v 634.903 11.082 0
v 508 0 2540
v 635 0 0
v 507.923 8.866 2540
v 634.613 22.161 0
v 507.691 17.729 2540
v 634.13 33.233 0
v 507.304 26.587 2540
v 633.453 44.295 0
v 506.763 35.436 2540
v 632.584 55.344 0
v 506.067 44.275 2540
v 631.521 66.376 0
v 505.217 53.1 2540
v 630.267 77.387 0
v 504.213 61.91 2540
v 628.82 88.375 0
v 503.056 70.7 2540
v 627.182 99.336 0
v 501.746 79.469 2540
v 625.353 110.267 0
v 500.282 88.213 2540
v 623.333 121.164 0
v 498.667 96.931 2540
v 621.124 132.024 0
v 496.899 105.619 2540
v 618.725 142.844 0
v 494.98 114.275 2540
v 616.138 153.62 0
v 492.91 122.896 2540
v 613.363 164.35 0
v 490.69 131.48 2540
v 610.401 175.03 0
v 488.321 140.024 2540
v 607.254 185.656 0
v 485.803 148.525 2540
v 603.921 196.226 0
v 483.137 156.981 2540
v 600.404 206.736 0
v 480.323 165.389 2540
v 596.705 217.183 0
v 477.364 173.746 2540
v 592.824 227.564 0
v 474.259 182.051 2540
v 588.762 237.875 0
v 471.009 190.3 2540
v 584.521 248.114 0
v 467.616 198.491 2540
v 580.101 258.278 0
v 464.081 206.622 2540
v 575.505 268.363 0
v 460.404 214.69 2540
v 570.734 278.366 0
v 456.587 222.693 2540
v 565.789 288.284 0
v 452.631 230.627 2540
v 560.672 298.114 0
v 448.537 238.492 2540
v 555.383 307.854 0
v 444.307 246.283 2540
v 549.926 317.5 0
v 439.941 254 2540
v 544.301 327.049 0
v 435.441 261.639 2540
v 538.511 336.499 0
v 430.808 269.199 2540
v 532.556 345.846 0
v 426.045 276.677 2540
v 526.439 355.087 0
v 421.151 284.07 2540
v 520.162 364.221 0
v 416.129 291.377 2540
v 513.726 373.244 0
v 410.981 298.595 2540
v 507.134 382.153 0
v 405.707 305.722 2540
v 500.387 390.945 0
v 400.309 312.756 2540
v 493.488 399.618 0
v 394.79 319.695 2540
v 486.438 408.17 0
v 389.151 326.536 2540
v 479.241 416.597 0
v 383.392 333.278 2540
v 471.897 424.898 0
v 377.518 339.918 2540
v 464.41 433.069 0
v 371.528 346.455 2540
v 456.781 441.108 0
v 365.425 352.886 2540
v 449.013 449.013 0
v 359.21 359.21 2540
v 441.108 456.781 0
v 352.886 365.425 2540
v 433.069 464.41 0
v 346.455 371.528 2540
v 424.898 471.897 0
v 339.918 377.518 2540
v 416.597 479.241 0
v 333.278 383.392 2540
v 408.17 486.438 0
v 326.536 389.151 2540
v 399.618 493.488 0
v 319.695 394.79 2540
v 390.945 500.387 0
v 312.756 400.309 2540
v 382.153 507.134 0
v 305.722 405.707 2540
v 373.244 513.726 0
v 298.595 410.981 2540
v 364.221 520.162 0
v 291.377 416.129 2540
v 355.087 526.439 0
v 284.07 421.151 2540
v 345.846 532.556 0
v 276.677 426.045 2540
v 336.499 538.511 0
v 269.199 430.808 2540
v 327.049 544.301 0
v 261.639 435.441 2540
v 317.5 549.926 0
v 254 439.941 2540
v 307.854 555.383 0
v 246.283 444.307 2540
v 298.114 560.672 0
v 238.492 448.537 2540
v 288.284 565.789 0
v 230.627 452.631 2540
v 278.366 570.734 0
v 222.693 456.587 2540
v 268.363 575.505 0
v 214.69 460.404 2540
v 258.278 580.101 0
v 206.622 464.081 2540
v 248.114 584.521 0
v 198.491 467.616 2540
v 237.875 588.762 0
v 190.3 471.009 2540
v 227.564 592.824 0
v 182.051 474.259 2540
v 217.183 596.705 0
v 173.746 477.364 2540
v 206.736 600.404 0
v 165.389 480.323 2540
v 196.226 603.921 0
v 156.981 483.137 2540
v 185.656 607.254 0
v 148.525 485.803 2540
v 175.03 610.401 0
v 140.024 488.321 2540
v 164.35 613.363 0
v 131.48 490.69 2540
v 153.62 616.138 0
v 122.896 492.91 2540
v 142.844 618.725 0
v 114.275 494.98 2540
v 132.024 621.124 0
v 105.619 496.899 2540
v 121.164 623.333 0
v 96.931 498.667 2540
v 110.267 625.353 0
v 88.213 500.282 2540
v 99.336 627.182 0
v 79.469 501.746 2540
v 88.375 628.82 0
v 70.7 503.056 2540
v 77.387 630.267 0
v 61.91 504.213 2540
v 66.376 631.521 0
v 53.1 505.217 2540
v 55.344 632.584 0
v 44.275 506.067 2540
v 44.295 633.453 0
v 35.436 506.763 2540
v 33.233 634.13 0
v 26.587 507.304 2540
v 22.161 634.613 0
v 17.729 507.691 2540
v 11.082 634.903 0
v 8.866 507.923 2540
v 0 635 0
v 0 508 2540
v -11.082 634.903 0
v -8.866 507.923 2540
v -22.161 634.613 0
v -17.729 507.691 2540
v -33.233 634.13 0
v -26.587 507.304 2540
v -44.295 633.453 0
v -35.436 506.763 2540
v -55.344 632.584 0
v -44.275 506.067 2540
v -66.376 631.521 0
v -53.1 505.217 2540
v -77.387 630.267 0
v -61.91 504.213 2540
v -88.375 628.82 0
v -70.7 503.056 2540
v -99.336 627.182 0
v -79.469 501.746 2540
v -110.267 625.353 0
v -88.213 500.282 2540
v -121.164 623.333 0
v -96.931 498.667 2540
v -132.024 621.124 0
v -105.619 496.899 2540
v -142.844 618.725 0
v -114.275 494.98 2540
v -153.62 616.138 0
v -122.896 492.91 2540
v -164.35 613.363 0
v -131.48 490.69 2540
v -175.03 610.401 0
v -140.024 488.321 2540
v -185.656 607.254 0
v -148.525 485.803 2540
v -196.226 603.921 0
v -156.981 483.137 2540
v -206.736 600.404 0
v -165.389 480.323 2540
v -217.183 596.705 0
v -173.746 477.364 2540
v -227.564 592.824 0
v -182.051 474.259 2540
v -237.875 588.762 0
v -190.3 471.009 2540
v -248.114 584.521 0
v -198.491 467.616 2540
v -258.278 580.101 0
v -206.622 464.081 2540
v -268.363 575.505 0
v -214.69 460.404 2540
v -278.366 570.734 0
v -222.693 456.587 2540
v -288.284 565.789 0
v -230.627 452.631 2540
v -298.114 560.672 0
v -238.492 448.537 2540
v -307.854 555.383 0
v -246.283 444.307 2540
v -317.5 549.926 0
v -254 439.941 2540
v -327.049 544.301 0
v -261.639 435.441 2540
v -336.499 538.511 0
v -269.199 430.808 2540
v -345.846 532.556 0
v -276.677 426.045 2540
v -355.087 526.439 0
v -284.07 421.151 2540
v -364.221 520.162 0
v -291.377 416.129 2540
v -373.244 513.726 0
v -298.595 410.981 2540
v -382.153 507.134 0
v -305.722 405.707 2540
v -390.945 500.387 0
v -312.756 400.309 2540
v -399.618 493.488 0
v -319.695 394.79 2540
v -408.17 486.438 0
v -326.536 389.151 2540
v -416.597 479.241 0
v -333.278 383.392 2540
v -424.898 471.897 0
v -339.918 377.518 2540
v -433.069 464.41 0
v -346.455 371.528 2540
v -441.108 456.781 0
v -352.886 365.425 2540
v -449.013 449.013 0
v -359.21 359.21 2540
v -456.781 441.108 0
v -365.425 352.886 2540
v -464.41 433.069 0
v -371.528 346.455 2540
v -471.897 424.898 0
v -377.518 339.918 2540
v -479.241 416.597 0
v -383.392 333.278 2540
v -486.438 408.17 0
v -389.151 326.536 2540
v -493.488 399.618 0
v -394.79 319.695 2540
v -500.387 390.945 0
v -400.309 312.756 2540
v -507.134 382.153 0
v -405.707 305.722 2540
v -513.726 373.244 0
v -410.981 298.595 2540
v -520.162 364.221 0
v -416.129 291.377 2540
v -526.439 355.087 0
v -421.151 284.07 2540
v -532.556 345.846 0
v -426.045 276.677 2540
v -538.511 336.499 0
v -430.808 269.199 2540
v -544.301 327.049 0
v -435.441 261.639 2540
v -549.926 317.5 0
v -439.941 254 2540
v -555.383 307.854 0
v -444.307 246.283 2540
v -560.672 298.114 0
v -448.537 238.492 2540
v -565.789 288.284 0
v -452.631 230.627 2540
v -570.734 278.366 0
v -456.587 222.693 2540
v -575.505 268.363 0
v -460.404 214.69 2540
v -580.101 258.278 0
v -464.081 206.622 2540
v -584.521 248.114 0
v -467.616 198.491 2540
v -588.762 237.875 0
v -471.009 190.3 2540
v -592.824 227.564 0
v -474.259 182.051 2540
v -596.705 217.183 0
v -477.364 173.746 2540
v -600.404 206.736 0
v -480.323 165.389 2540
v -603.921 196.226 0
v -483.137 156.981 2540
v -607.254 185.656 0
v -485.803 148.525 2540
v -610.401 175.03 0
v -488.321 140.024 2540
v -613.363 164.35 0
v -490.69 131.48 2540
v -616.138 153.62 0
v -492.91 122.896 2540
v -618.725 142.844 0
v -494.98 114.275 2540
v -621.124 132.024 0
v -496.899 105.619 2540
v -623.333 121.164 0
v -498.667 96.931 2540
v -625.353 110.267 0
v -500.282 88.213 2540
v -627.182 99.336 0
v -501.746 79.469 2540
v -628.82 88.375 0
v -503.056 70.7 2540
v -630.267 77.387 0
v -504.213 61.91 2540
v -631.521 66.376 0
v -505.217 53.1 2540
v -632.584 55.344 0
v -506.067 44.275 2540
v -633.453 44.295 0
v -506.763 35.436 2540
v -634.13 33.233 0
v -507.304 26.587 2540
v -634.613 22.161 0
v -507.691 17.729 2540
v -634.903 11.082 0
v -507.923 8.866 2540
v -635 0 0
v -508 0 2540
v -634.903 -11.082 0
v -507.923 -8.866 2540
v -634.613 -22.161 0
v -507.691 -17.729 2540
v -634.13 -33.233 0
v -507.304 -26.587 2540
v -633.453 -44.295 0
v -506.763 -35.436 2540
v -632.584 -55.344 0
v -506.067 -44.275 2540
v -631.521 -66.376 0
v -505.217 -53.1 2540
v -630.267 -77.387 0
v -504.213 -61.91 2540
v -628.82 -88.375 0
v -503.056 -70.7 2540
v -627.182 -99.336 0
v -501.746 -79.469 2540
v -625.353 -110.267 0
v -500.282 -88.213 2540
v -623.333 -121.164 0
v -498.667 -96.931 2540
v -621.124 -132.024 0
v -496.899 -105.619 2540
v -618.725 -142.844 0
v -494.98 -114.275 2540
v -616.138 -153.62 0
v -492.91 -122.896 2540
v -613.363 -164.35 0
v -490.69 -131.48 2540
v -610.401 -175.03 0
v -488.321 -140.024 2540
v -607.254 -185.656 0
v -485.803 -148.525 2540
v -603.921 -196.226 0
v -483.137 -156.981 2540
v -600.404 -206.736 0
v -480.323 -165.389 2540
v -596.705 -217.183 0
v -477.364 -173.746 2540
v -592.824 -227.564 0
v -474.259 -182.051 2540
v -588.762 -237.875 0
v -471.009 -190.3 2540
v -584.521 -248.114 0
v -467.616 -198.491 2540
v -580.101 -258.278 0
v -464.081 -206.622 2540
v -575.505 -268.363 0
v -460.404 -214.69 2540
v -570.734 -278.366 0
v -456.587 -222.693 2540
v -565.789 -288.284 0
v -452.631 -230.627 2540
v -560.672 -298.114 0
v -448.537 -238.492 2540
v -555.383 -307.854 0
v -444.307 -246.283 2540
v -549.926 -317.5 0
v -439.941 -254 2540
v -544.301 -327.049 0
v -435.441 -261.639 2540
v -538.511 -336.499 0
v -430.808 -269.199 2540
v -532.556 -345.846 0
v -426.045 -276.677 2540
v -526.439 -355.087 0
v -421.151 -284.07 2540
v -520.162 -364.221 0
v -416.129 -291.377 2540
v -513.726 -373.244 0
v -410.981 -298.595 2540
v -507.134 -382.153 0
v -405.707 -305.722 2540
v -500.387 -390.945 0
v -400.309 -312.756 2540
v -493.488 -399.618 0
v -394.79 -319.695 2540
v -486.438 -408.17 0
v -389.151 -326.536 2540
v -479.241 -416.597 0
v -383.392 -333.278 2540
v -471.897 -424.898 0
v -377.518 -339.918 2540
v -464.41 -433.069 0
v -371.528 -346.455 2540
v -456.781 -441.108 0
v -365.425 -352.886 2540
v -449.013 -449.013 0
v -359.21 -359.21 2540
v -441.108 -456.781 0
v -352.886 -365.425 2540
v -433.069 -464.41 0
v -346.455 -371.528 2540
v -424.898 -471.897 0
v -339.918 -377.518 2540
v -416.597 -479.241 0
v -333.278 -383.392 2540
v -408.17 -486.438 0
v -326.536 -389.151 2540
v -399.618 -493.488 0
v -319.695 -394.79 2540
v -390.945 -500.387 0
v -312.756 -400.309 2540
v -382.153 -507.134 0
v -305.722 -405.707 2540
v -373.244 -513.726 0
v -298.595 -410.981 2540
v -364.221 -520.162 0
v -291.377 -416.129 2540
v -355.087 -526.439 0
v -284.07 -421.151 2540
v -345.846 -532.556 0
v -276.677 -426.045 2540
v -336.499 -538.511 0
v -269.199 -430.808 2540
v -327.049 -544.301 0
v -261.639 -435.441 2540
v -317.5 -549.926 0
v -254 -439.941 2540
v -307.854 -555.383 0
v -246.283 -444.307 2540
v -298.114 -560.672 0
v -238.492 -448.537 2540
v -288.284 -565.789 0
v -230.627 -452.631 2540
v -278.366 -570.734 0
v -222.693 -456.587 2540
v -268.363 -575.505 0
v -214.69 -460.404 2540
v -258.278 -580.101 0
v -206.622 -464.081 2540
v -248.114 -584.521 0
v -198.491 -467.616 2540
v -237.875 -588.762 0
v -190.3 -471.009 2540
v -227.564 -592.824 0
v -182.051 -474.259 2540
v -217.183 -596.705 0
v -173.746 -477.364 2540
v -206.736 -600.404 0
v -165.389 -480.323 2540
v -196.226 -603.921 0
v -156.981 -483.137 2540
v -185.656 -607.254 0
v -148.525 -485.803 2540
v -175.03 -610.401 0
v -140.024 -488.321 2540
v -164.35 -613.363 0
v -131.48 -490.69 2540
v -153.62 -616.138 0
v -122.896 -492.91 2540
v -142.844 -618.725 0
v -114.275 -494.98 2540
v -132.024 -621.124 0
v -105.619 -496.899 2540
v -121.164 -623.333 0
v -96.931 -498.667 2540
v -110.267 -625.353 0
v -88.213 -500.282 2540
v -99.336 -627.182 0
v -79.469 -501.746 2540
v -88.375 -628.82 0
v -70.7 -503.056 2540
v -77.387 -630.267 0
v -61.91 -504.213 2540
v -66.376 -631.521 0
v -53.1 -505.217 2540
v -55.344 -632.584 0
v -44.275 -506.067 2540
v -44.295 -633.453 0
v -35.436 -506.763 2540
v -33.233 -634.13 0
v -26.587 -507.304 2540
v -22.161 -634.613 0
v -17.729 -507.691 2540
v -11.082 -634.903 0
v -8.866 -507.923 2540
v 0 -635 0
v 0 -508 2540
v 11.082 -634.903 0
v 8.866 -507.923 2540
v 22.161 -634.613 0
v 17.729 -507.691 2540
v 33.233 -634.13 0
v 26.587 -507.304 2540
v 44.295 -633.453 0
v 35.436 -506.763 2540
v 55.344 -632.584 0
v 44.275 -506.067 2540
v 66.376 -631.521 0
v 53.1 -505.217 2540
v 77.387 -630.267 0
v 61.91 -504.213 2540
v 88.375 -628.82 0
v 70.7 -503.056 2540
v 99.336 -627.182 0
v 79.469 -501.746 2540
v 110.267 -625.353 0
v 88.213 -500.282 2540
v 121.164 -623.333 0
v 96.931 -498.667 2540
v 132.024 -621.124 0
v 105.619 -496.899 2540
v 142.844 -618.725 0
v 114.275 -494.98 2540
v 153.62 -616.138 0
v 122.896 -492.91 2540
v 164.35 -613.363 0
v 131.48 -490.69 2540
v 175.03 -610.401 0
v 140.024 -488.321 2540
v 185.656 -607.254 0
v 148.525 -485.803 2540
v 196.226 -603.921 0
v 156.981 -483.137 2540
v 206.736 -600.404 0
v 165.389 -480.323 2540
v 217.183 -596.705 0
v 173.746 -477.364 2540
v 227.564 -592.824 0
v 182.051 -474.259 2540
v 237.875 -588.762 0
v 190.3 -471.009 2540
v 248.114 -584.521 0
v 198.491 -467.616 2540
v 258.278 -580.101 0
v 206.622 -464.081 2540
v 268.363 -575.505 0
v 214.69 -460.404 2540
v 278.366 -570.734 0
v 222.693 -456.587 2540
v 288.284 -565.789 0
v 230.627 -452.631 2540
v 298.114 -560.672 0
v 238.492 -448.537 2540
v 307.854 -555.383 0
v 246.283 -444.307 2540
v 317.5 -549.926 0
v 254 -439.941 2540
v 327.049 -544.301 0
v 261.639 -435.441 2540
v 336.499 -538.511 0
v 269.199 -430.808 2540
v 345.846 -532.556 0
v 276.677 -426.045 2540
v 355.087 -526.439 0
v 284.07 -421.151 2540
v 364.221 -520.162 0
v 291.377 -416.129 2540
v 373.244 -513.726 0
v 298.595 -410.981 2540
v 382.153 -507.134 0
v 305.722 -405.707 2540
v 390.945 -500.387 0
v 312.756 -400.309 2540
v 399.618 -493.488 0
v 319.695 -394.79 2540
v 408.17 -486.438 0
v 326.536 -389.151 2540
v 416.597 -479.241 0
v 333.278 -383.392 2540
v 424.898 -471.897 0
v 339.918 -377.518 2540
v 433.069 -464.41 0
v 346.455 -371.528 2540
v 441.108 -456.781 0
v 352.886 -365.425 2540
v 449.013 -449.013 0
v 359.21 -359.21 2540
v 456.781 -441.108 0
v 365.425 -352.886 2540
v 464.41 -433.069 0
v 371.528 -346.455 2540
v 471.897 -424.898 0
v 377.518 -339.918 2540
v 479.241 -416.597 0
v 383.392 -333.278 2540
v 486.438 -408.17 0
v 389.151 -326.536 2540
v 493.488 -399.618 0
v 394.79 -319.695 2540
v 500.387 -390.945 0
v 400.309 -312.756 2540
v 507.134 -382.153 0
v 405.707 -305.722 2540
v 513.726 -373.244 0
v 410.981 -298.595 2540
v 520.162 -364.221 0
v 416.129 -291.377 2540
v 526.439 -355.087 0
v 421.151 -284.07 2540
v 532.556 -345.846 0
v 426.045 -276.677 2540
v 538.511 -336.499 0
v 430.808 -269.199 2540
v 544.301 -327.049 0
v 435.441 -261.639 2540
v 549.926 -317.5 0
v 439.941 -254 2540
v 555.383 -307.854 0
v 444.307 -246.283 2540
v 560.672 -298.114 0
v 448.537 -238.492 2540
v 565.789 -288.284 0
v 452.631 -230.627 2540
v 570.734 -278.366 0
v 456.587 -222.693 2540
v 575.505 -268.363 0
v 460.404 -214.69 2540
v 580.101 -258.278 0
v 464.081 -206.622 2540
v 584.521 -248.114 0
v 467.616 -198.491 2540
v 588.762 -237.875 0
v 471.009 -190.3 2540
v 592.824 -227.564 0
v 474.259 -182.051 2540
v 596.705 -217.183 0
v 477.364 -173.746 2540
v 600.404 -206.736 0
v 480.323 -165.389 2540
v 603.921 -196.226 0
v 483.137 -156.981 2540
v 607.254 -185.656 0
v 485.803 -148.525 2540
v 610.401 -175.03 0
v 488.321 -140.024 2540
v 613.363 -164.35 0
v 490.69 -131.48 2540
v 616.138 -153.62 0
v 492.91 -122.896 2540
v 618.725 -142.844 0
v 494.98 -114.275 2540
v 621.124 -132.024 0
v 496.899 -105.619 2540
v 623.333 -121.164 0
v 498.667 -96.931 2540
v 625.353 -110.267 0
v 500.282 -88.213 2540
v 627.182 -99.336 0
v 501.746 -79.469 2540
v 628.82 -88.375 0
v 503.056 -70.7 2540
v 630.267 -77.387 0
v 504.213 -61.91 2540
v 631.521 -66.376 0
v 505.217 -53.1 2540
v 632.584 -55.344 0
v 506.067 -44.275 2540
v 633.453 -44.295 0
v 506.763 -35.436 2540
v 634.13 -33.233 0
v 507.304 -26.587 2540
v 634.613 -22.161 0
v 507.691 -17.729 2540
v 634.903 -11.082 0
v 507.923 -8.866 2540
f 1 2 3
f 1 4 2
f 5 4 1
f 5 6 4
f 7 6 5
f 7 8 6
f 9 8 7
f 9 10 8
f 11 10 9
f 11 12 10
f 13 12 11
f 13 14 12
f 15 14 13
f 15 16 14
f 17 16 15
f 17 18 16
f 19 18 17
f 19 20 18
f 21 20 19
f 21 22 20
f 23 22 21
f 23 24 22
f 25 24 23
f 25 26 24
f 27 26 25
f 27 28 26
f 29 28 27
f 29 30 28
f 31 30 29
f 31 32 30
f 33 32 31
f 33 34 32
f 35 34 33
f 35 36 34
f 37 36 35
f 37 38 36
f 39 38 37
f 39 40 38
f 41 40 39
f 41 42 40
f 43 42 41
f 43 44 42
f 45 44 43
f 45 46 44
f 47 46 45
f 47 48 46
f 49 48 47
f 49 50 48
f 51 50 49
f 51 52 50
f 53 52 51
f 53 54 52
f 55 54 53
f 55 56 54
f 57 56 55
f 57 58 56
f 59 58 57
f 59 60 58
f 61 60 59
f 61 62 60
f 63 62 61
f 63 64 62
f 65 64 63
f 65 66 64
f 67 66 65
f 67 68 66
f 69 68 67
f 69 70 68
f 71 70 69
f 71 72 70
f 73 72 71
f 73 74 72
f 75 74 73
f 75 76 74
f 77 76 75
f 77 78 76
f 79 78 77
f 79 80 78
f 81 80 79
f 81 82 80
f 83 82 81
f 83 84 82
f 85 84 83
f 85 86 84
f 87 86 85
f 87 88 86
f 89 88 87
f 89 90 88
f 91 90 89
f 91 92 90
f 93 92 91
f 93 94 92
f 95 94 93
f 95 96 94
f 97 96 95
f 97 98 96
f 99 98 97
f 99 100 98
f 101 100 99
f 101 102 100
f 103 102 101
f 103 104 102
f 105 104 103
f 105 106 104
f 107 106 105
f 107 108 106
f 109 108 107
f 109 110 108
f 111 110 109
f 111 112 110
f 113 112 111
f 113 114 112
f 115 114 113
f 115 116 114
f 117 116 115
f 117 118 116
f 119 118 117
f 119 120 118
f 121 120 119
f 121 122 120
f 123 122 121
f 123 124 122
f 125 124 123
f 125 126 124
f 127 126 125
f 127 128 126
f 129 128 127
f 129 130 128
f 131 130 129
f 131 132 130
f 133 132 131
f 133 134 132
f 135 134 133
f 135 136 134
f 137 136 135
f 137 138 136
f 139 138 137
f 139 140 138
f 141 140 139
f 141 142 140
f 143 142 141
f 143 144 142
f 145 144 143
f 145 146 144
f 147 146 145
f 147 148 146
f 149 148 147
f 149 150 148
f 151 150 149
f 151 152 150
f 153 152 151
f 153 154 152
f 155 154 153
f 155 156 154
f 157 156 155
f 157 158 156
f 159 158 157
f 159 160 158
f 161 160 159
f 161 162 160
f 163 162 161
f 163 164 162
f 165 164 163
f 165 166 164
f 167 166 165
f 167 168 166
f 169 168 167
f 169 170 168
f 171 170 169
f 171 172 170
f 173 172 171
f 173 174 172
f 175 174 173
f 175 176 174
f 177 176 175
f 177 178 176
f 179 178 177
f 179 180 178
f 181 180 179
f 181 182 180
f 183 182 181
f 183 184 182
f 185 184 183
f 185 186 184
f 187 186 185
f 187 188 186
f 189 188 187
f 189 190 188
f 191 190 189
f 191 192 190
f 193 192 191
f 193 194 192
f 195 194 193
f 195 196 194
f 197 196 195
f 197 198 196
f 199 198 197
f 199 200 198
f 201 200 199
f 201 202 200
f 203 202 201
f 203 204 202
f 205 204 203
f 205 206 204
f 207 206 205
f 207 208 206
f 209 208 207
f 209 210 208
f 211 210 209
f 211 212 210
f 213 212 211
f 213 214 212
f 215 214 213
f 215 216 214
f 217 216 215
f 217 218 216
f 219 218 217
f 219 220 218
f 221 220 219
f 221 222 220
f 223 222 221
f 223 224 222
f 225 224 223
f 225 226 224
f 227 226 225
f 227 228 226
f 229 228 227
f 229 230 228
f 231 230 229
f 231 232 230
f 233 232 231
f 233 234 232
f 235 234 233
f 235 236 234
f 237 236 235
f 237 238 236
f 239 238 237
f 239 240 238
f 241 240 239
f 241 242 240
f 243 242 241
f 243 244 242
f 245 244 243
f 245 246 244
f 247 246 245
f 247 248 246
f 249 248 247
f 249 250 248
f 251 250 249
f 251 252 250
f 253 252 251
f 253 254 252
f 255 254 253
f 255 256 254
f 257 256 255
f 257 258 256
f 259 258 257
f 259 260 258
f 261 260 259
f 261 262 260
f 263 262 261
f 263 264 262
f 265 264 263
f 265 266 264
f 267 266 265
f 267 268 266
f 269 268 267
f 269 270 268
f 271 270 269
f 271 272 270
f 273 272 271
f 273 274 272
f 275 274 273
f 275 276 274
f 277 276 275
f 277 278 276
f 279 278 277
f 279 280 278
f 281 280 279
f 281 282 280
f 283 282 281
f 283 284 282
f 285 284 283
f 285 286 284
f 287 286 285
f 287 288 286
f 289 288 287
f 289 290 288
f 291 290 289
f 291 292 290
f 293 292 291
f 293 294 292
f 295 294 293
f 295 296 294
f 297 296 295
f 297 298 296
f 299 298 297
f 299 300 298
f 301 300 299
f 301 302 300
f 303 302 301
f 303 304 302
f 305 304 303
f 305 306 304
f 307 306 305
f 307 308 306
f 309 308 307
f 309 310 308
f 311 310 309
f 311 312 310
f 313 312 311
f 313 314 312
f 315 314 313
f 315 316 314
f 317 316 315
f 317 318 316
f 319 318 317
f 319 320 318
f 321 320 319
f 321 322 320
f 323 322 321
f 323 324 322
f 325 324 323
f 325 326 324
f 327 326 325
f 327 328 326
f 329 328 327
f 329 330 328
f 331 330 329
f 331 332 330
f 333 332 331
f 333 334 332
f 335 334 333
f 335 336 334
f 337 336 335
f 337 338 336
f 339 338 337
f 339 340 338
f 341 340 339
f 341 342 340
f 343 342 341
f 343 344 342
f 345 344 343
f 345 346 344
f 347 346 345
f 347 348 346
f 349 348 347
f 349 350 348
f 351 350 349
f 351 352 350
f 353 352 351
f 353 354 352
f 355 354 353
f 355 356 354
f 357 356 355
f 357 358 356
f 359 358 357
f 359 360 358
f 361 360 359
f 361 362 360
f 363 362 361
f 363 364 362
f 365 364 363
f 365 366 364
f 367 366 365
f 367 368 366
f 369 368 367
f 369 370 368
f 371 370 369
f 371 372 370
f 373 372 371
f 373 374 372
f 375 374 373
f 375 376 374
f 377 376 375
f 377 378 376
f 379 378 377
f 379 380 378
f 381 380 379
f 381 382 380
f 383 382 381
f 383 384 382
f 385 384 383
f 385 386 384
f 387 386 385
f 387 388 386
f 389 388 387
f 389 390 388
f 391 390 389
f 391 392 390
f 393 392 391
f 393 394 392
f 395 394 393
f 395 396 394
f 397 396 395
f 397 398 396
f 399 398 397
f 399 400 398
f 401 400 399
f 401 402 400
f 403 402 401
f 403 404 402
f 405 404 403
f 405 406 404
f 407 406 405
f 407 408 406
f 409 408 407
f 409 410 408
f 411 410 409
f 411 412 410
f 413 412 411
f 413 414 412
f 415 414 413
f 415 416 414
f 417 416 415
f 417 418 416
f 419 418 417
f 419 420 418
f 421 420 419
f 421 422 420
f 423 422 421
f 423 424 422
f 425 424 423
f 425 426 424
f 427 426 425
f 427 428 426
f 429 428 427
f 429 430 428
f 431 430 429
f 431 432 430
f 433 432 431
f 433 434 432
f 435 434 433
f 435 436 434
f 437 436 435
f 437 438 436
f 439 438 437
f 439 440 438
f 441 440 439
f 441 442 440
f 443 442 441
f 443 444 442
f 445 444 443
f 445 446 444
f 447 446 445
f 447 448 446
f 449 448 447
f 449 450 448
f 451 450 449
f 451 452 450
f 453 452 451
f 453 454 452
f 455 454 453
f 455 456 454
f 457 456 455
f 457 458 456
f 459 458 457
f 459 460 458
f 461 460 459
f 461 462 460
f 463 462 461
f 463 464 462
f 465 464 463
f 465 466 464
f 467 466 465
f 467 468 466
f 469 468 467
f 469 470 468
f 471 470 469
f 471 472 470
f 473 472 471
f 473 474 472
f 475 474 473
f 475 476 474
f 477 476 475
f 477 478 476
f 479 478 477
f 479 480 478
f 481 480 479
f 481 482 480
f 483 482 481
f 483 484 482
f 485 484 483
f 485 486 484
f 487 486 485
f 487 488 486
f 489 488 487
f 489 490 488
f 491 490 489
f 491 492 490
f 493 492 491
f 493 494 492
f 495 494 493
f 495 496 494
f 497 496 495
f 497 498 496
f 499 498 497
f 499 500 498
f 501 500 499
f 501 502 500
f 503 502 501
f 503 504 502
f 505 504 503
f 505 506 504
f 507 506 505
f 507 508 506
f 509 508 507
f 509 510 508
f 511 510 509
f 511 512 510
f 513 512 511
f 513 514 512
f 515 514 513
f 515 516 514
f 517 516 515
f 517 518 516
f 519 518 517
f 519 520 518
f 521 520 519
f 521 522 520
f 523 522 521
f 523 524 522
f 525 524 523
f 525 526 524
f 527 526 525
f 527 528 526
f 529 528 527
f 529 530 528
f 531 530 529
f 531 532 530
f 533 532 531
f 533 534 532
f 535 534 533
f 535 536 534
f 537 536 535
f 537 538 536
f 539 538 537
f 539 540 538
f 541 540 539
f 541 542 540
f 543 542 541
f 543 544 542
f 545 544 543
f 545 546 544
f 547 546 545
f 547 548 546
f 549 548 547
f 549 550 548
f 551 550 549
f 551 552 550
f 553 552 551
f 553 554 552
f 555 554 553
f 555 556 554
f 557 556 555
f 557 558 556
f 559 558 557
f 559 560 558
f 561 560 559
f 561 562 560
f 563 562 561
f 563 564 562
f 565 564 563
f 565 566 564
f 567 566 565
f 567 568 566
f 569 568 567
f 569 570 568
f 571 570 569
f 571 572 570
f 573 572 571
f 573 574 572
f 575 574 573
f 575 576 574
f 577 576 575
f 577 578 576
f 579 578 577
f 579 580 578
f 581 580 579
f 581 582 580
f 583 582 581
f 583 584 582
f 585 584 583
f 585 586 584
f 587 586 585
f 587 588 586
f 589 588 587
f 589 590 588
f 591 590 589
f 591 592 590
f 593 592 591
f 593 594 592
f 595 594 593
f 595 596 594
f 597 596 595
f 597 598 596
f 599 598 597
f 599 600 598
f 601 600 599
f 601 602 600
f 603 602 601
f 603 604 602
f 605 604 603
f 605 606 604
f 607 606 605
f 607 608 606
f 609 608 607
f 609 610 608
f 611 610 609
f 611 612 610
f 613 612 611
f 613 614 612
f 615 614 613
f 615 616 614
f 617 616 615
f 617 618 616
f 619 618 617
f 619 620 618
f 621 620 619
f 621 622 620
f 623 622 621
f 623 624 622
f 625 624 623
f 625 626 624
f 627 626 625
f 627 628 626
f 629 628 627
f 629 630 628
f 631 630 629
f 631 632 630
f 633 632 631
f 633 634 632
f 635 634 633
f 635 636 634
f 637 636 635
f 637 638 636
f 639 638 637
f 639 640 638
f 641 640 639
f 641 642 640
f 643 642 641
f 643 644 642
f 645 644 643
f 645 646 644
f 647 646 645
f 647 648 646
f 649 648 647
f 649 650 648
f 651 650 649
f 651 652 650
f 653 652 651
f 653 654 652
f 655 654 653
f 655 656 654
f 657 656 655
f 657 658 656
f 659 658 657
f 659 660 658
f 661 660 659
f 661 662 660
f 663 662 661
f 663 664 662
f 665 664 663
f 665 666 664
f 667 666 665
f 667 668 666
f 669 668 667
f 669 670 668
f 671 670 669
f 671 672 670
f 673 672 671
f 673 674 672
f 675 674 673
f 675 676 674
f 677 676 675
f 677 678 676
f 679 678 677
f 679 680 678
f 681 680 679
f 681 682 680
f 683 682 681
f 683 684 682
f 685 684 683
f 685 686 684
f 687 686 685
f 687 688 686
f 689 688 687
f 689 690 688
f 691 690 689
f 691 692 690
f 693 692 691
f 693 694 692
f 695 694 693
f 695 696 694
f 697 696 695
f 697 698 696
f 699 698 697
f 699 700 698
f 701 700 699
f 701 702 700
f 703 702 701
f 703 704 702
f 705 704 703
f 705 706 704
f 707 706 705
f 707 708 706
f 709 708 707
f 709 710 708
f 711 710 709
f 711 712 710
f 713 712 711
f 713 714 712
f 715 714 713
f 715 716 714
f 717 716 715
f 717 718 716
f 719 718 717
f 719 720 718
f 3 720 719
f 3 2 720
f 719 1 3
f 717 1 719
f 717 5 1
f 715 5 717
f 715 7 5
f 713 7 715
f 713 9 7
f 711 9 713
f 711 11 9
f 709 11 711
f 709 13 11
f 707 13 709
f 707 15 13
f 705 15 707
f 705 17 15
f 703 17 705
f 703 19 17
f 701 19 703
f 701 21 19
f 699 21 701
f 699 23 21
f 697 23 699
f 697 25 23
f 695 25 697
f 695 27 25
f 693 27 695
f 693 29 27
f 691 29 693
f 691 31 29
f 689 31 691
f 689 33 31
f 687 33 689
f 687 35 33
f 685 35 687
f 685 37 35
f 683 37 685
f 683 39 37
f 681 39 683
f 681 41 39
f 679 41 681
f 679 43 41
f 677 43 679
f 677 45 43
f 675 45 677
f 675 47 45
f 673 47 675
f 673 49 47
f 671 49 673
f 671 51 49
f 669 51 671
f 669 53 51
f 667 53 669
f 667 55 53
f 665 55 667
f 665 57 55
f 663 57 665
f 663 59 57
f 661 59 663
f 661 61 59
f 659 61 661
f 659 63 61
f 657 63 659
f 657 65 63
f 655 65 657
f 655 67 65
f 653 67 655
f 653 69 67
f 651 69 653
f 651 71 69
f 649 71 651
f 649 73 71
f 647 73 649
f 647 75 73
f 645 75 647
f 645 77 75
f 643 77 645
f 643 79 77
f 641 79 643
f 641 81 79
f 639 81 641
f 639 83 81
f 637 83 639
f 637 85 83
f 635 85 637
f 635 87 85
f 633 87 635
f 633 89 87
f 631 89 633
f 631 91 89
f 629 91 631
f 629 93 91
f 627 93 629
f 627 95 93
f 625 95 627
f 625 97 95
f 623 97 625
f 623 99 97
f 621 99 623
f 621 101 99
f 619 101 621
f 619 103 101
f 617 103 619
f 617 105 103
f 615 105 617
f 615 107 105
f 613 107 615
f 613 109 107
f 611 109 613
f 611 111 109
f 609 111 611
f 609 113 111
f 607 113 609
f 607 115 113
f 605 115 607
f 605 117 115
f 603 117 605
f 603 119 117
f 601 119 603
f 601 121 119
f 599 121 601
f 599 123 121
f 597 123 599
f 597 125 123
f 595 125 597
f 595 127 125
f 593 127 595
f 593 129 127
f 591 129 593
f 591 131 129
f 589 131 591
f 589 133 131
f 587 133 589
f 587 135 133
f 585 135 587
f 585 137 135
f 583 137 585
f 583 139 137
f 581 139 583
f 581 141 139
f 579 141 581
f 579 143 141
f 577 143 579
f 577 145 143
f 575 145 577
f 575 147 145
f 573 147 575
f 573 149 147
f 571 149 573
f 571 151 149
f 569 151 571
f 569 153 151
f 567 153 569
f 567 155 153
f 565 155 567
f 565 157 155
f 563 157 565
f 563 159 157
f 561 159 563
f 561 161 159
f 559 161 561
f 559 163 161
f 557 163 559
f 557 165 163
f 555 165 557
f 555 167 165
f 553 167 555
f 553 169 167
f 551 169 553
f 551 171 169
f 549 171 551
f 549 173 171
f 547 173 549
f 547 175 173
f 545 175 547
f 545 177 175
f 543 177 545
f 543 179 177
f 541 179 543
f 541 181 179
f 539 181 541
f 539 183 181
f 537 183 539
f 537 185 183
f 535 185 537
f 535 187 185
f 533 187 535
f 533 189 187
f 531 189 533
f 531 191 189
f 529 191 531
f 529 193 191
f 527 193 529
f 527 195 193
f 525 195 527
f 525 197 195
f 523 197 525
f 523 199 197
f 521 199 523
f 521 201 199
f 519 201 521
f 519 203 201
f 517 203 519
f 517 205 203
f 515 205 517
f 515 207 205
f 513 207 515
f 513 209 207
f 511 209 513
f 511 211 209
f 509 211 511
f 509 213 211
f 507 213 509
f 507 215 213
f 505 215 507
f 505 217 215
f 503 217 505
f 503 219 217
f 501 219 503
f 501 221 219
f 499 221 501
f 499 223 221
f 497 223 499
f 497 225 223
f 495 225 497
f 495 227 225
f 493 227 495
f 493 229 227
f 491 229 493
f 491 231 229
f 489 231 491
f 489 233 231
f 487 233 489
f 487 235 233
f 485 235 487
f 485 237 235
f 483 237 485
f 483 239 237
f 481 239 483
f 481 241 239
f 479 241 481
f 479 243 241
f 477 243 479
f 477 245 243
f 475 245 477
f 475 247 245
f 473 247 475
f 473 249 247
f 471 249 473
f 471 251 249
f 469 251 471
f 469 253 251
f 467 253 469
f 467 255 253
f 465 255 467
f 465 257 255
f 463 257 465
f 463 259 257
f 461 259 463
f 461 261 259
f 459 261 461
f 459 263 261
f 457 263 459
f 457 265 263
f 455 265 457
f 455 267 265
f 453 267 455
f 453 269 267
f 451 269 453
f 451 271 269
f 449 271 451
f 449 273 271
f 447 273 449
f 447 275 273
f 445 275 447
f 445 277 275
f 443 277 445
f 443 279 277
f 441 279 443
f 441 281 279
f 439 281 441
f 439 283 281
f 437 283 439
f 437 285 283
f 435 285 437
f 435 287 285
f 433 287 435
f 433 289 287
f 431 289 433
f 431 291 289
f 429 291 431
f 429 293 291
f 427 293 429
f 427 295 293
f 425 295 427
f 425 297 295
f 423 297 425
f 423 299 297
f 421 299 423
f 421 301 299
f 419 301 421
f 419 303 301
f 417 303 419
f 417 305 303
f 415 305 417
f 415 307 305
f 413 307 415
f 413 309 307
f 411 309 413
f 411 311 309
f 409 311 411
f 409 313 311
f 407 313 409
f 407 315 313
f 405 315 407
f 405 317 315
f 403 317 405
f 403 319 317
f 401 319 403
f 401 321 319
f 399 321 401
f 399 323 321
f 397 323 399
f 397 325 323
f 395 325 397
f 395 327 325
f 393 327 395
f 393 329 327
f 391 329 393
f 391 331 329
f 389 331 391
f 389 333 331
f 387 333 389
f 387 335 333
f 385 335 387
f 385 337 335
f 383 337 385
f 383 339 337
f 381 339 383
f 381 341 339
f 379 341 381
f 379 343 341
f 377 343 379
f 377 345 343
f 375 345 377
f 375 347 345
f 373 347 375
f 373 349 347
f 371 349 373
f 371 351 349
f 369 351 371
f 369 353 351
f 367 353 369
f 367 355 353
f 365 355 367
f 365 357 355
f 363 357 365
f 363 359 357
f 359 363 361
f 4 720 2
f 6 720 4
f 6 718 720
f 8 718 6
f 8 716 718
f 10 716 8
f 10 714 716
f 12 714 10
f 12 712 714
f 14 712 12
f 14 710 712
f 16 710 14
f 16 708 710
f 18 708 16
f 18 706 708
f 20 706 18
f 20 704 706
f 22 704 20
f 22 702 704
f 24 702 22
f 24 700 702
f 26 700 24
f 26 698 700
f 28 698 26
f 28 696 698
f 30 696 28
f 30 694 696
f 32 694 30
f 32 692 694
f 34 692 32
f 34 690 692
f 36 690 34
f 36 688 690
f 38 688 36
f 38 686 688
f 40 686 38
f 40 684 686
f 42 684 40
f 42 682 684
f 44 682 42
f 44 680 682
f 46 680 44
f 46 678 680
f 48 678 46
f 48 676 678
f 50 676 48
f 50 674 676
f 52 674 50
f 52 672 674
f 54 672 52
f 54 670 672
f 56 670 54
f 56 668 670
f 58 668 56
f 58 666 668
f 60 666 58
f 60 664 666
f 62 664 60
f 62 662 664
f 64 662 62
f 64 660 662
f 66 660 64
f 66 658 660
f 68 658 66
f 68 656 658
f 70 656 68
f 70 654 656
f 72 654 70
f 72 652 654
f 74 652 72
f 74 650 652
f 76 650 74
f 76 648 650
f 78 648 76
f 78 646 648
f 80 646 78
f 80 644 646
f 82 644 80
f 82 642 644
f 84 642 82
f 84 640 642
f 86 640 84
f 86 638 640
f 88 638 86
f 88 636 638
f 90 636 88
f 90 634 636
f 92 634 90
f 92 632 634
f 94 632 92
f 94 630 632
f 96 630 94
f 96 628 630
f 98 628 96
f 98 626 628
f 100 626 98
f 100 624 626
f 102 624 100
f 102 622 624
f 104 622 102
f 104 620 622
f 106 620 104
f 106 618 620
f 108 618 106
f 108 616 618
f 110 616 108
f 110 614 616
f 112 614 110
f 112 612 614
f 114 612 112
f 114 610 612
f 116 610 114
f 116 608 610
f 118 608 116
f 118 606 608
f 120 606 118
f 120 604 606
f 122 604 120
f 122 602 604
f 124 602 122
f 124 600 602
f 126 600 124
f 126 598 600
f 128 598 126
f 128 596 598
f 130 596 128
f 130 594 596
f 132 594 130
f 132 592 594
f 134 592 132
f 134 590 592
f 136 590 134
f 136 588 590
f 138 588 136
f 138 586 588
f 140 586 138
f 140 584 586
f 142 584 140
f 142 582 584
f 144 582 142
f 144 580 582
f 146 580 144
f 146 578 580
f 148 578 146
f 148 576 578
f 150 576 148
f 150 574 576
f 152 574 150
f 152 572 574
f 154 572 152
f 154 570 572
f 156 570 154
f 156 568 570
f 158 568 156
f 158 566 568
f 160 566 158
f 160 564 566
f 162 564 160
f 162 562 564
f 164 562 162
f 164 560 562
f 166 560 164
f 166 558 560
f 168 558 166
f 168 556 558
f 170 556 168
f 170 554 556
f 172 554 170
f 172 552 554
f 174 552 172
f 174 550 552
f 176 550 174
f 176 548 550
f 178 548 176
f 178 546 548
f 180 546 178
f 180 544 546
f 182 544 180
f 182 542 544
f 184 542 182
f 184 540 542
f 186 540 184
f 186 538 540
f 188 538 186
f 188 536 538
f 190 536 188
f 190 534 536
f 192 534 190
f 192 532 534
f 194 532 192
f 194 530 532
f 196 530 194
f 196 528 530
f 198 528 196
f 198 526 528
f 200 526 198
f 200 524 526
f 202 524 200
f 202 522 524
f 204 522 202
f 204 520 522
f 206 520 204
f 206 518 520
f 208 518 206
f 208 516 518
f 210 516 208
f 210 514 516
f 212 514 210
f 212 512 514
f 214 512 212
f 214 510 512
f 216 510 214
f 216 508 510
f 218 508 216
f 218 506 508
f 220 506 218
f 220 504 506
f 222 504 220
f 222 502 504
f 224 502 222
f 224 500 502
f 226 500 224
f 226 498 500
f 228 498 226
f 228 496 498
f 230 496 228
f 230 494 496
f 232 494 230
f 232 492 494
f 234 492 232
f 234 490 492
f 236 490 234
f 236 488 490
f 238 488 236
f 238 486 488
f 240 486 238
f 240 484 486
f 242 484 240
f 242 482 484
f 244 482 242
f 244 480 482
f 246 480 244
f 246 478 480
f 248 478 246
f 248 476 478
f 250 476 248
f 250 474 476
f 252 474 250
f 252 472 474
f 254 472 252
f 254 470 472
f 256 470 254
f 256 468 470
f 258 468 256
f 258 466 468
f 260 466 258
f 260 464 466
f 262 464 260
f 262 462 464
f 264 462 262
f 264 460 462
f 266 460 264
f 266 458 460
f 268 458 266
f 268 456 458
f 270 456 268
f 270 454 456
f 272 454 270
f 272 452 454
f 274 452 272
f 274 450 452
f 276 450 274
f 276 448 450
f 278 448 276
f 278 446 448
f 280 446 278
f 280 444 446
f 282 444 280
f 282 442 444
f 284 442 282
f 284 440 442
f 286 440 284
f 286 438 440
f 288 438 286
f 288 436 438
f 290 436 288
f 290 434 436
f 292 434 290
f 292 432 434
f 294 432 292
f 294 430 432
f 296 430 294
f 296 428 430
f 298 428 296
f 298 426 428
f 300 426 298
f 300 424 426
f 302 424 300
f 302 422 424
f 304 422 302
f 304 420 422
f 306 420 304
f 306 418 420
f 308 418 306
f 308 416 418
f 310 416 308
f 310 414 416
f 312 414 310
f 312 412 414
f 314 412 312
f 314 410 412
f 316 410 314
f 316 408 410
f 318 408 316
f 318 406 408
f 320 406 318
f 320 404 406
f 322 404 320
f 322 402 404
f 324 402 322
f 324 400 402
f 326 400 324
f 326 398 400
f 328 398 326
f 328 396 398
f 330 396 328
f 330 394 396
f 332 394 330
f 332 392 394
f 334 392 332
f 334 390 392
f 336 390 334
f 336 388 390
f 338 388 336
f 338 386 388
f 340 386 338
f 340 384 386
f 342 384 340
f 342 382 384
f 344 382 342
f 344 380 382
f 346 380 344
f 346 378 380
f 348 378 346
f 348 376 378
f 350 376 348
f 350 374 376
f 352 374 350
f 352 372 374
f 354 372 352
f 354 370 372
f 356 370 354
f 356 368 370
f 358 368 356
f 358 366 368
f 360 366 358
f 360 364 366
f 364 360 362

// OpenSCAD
// Unit of length: Unit.MM
cylinder(h = 2540.0, d1 = 1270.0, d2 = 1016.0, center = false, $fn = 360);
